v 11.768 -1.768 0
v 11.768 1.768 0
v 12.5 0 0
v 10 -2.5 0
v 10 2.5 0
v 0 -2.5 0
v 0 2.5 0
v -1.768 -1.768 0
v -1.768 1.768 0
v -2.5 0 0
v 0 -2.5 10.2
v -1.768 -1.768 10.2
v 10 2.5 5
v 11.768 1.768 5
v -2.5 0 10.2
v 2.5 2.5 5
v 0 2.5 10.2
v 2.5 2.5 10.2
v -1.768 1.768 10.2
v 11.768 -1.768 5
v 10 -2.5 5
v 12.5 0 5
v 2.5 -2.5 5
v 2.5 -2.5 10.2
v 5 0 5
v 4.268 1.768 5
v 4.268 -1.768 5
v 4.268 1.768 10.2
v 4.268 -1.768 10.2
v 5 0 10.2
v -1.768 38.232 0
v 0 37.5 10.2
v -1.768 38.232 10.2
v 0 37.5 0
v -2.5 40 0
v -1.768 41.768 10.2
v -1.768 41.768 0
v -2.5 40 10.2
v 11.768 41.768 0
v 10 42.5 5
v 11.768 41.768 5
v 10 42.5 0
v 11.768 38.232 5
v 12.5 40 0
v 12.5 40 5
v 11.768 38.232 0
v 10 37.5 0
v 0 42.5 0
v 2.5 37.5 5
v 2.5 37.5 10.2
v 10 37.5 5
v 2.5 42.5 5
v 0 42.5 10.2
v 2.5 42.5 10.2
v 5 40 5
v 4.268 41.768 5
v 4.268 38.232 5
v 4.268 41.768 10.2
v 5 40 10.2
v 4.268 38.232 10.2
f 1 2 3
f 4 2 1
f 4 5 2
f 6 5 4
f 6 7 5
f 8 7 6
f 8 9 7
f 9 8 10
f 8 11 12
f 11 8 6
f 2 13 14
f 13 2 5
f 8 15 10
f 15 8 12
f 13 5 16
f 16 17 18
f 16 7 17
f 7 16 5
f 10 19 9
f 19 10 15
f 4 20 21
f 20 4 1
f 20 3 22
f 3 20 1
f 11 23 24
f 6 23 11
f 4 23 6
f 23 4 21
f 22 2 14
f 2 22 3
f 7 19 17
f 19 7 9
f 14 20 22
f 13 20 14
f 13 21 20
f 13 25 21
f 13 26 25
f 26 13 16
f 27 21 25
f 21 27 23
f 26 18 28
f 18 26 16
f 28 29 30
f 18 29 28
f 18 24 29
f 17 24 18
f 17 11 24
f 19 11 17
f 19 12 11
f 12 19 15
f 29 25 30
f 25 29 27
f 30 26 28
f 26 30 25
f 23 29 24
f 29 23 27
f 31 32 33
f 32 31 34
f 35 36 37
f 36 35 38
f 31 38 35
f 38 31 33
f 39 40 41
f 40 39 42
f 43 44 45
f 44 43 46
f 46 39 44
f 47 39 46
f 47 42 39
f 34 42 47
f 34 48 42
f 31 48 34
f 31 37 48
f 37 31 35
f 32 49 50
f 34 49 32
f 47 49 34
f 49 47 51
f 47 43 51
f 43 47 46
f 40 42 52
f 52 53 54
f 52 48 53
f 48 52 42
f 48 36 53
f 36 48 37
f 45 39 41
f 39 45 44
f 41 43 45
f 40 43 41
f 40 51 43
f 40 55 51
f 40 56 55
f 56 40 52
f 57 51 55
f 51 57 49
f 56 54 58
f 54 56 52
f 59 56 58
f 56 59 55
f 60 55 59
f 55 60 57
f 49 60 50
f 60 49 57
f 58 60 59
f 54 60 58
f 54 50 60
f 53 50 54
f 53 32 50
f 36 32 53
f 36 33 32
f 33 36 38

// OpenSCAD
// --------------------------------------------------------------
//  Author: Angel Roman
//  GitHub: https://github.com/legna-namor
//  Purpose: IKEA Skadis Peg For Attachments
// --------------------------------------------------------------
// Define parameters
height1 = 5;
height2 = 5.2;
width = 5;
length1 = 15;
length2 = 7.5;
// --------------------------------------------------------------
// Peg module
module peg(height, width, length) {
    linear_extrude(height) {
        hull() {
            translate([length - width, 0, 0]) circle(d = width);
            circle(d = width);
        }
    }
}
// --------------------------------------------------------------
// Call the peg module with three sets of parameters
peg(height1, width, length1);
translate([0, 0, height1]) peg(height2, width, length2);
translate([0, 40, 0]) peg(height1, width, length1);
translate([0, 40, height1]) peg(height2, width, length2);
// --------------------------------------------------------------
